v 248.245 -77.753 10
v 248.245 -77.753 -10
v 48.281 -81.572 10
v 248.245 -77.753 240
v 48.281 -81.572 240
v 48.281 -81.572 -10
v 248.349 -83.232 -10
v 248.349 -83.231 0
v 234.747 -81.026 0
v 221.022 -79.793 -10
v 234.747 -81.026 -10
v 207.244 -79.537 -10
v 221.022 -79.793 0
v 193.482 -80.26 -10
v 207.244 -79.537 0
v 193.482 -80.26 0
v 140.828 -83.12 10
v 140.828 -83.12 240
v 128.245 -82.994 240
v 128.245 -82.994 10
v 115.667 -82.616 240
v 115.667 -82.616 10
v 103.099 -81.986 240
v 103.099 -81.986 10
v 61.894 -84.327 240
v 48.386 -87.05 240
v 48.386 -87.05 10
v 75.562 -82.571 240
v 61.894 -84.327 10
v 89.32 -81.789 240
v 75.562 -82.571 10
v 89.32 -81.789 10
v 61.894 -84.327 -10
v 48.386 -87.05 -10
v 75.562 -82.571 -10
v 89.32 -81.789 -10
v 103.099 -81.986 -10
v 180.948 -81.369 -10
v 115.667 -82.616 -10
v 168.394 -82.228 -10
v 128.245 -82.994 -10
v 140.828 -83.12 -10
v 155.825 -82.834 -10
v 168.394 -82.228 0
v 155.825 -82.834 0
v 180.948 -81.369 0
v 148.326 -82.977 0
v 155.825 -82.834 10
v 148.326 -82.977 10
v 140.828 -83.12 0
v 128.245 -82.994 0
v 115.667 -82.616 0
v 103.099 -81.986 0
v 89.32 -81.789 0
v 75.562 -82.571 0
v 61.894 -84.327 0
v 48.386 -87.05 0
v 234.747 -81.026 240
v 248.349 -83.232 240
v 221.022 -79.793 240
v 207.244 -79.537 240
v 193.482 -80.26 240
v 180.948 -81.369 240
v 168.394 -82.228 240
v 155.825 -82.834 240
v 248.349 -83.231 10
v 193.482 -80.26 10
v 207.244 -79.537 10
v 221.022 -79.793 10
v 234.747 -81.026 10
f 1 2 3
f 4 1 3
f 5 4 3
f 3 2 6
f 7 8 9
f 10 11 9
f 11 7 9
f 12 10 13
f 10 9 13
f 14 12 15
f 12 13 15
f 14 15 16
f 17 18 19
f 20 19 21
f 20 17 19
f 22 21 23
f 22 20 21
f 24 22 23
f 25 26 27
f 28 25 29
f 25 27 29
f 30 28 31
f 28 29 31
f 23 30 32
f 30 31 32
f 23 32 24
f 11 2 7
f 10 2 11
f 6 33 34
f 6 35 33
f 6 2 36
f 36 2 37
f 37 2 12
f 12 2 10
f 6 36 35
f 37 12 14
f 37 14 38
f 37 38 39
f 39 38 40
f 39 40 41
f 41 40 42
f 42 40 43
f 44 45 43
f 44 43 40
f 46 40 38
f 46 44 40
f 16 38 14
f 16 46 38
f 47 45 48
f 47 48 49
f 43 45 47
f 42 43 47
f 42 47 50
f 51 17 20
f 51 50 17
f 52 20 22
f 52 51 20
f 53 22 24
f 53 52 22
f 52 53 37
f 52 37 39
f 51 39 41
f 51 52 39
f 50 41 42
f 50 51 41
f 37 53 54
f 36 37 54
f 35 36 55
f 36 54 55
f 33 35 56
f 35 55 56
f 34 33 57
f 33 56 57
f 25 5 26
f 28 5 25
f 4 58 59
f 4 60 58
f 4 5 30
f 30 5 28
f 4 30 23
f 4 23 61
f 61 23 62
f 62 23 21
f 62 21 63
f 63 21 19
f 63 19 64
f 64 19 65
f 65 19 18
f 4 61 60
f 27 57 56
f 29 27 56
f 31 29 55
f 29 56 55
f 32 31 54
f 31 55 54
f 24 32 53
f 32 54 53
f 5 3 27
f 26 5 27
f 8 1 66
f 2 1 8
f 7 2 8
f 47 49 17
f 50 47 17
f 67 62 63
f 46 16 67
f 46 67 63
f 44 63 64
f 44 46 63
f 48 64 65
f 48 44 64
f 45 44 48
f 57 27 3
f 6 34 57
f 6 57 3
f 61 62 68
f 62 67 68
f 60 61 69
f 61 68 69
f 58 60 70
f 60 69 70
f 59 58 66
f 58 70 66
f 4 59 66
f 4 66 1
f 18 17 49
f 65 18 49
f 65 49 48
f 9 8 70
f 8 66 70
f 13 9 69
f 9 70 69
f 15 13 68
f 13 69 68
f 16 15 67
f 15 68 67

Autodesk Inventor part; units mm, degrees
ref_plane "YZ Plane" through (0, 0, 0) normal (1, 0, 0) x (0, 1, 0)
ref_plane "XZ Plane" through (0, 0, 0) normal (0, 1, 0) x (-1, 0, 0)
sketch "Sketch1" plane through (0, 0, 0) normal (0, 0, 1) x (1, 0, 0)
  line L0 (0, 0) -> (293.4944, 0) construction
  line L1 (293.4944, 0) -> (293.4944, -132.0217) construction
  line L2 (293.4944, -132.0217) -> (0, -132.0217) construction
  line L3 (0, -132.0217) -> (0, 0) construction
  line L4 (79.3681, -56.3049) -> (159.3681, -56.3049) construction
  line L5 (283.1562, -93.1287) -> (274.2161, -88.6482) construction
  line L6 (283.1562, -93.1287) -> (282.3201, -93.1287) construction
  line L7 (18.3483, -97.5091) -> (27.4302, -93.3236) construction
  line L8 (18.3483, -97.5091) -> (20.5956, -97.5091) construction
  arc A0 (103.0994, -81.9859) -> (27.4302, -93.3236) centre (93.4367, -275.677) ccw
  arc A1 (274.2161, -88.6482) -> (204.4098, -79.893) centre (217.7822, -255.937) ccw
  arc A2 (103.0994, -81.9859) -> (204.4098, -79.893) centre (140.8276, 544.7964) ccw
  line L9 (27.4302, -93.3236) -> (27.4302, -72.2735)
  line L10 (27.4302, -72.2735) -> (272.6166, -67.591)
  line L11 (272.6166, -67.591) -> (274.2161, -88.6482)
  line L12 (103.0994, -81.9859) -> (86.3195, -71.1488) construction
  line L13 (204.4098, -79.893) -> (220.9707, -68.5773) construction
  line L14 (86.3195, -71.1488) -> (86.3195, -81.1488) construction
  line L15 (86.3195, -81.1488) -> (103.0994, -81.9859) construction
  line L16 (220.9707, -68.5773) -> (221.7303, -78.5773) construction
  line L17 (221.7303, -78.5773) -> (204.4098, -79.893) construction
  dimension "d5" = 80
  dimension "d85" = 10
  dimension "d87" = 26.619
  dimension "d92" = 10
  dimension "d94" = 24.743
  dimension "d100" = 22.985
  dimension "d101" = 22.755
  dimension "d106" = 10
  dimension "d111" = 10
  dimension "d112" = 30
  dimension "d113" = 30
extrude "Extrusion1" add sketch "Sketch1" along normal blind 10
sketch "Sketch2" plane through (0, 0, 10) normal (0, 0, 1) x (1, 0, 0)
  arc A0 (103.0994, -81.9859) -> (204.4098, -79.893) centre (140.8276, 544.7964) ccw projected
  line L0 (272.6166, -67.591) -> (27.4302, -72.2735) projected
  line L1 (27.4302, -72.2735) -> (27.4302, -93.3236) projected
  line L2 (274.2161, -88.6482) -> (272.6166, -67.591) projected
  line L3 (125.3768, -83.1204) -> (158.7723, -83.1204)
  line L4 (140.8276, -83.1204) -> (140.8276, -70.1078)
  line L5 (140.8276, -76.6141) -> (27.4302, -76.6141)
  line L6 (140.8276, -76.6141) -> (273.302, -76.6141)
  arc A1 (274.2161, -88.6482) -> (204.4098, -79.893) centre (217.7822, -255.937) ccw projected
  line L7 (274.2161, -88.6482) -> (272.6166, -67.591) projected
  line L8 (272.6166, -67.591) -> (27.4302, -72.2735) projected
  line L9 (27.4302, -72.2735) -> (27.4302, -93.3236) projected
  arc A2 (103.0994, -81.9859) -> (27.4302, -93.3236) centre (93.4367, -275.677) ccw projected
  arc A3 (103.0994, -81.9859) -> (204.4098, -79.893) centre (140.8276, 544.7964) ccw projected
  line L10 (140.8276, -83.1204) -> (140.4575, -63.7401)
  point P0 (0, 0)
  point P1 (204.4098, -79.893)
  point P2 (140.5792, -70.1126)
  point P3 (140.7034, -76.6141)
  dimension "d121" = 113.3974
  dimension "d122" = 132.4743
extrude "Extrusion2" cut sketch "Sketch2" against normal blind 10 contours L4 L6 L2 A1 A0 | L10 L5 L4 | L5 L10 L0 L4 | L4 L0 L2 L6
sketch "Sketch4" plane through (0, 0, 10) normal (0, 0, 1) x (1, 0, 0)
  line L0 (140.5792, -70.1126) -> (27.4302, -72.2735) projected
  line L1 (27.4302, -72.2735) -> (27.4302, -93.3236) projected
  arc A0 (103.0994, -81.9859) -> (27.4302, -93.3236) centre (93.4367, -275.677) ccw projected
  arc A1 (103.0994, -81.9859) -> (140.8276, -83.1204) centre (140.8276, 544.7964) ccw projected
  line L2 (27.4302, -72.2735) -> (27.4302, -93.3236) projected
  arc A2 (103.0994, -81.9859) -> (27.4302, -93.3236) centre (93.4367, -275.677) ccw projected
  line L3 (27.4302, -72.2735) -> (27.8295, -93.1796)
  line L4 (140.8276, -83.1204) -> (140.5792, -70.1126) projected
  point P0 (0, 0)
  point P1 (253.7282, -67.9517)
  dimension "d128" = 90
extrude "Extrusion4" cut sketch "Sketch4" against normal blind 10 contours L3 A0 L1
sketch "Sketch6" plane through (0, 0, 10) normal (0, 0, 1) x (1, 0, 0)
  line L0 (27.4302, -72.2735) -> (27.8295, -93.1796) projected
  arc A0 (103.0994, -81.9859) -> (27.8295, -93.1796) centre (93.4367, -275.677) ccw projected
  arc A1 (103.0994, -81.9859) -> (140.8276, -83.1204) centre (140.8276, 544.7964) ccw projected
  line L1 (140.8276, -83.1204) -> (140.5792, -70.1126) projected
  line L2 (140.5792, -70.1126) -> (27.4302, -72.2735) projected
  line L3 (140.5792, -70.1126) -> (27.4302, -72.2735) projected
  line L4 (140.5792, -70.1126) -> (148.0778, -69.9694)
  line L5 (148.0778, -69.9694) -> (148.3263, -82.9772)
  line L6 (140.5792, -70.1126) -> (140.8276, -83.1204) projected
  line L7 (148.3263, -82.9772) -> (140.8276, -83.1204)
  point P0 (0, 0)
  dimension "d131" = 7.5
  dimension "d132" = 0
  dimension "d135" = 180
extrude "Extrusion5" add sketch "Sketch6" against normal blind 10 contours L4 L5 L7 L1
sketch "Sketch7" plane through (0, 0, 10) normal (0, 0, 1) x (1, 0, 0)
  line L0 (27.4302, -72.2735) -> (27.8295, -93.1796) projected
  arc A0 (103.0994, -81.9859) -> (27.8295, -93.1796) centre (93.4367, -275.677) ccw projected
  arc A1 (103.0994, -81.9859) -> (140.8276, -83.1204) centre (140.8276, 544.7964) ccw projected
  line L1 (140.8276, -83.1204) -> (148.3263, -82.9772) projected
  line L2 (148.3263, -82.9772) -> (148.0778, -69.9694) projected
  line L3 (148.0778, -69.9694) -> (27.4302, -72.2735) projected
  line L4 (268.7255, -67.6653) -> (269.1247, -88.5714)
  arc A2 (269.1247, -88.5714) -> (193.4823, -80.2598) centre (210.5334, -273.4407) ccw
  arc A3 (155.8249, -82.834) -> (193.4823, -80.2598) centre (131.8501, 544.6249) ccw
  line L5 (155.8249, -82.834) -> (148.3263, -82.9772)
  line L6 (148.0778, -69.9694) -> (268.7255, -67.6653)
  point P0 (0, 0)
extrude "Extrusion6" add sketch "Sketch7" against normal blind 10 contours L6 L4 A2 A3 L5 L2
sketch "Sketch8" plane through (0, 0, 10) normal (0, 0, 1) x (1, 0, 0)
  line L0 (27.4302, -72.2735) -> (27.8295, -93.1796) projected
  arc A0 (103.0994, -81.9859) -> (27.8295, -93.1796) centre (93.4367, -275.677) ccw projected
  arc A1 (103.0994, -81.9859) -> (140.8276, -83.1204) centre (140.8276, 544.7964) ccw projected
  line L1 (140.8276, -83.1204) -> (155.8249, -82.834) projected
  arc A2 (155.8249, -82.834) -> (193.4823, -80.2598) centre (131.8501, 544.6249) ccw projected
  arc A3 (269.1247, -88.5714) -> (193.4823, -80.2598) centre (210.5334, -273.4407) ccw projected
  line L2 (269.1247, -88.5714) -> (268.7255, -67.6653) projected
  line L3 (268.7255, -67.6653) -> (27.4302, -72.2735) projected
  line L4 (27.8295, -93.1796) -> (27.4302, -72.2735) projected
  line L5 (268.7255, -67.6653) -> (269.1247, -88.5714) projected
  line L6 (27.5859, -80.4275) -> (268.8812, -75.8193)
  point P0 (0, 0)
  dimension "d138" = 3
extrude "Extrusion7" cut sketch "Sketch8" against normal blind 10 contours L3 L2 L6 L0
sketch "Sketch9" plane through (0, 0, 0) normal (0, 0, -1) x (-1, 0, 0)
  line L0 (-27.5859, -80.4275) -> (-268.8812, -75.8193) projected
  line L1 (-268.8812, -75.8193) -> (-269.1247, -88.5714) projected
  arc A0 (-193.4823, -80.2598) -> (-269.1247, -88.5714) centre (-210.5334, -273.4407) ccw projected
  arc A1 (-193.4823, -80.2598) -> (-155.8249, -82.834) centre (-131.8501, 544.6249) ccw projected
  line L2 (-155.8249, -82.834) -> (-140.8276, -83.1204) projected
  arc A2 (-140.8276, -83.1204) -> (-103.0994, -81.9859) centre (-140.8276, 544.7964) ccw projected
  arc A3 (-27.8295, -93.1796) -> (-103.0994, -81.9859) centre (-93.4367, -275.677) ccw projected
  line L3 (-27.8295, -93.1796) -> (-27.5859, -80.4275) projected
  point P0 (0, 0)
extrude "Extrusion8" add sketch "Sketch9" along normal blind 10
sketch "Sketch10" plane through (0, 0, -10) normal (0, 0, -1) x (-1, 0, 0)
  line L0 (-27.5859, -80.4275) -> (-268.8812, -75.8193) projected
  line L1 (-268.8812, -75.8193) -> (-269.1247, -88.5714) projected
  arc A0 (-193.4823, -80.2598) -> (-269.1247, -88.5714) centre (-210.5334, -273.4407) ccw projected
  arc A1 (-193.4823, -80.2598) -> (-155.8249, -82.834) centre (-131.8501, 544.6249) ccw projected
  line L2 (-155.8249, -82.834) -> (-140.8276, -83.1204) projected
  arc A2 (-140.8276, -83.1204) -> (-103.0994, -81.9859) centre (-140.8276, 544.7964) ccw projected
  arc A3 (-27.8295, -93.1796) -> (-103.0994, -81.9859) centre (-93.4367, -275.677) ccw projected
  line L3 (-27.8295, -93.1796) -> (-27.5859, -80.4275) projected
  line L4 (-148.2336, -78.1234) -> (-148.3263, -82.9772)
  line L5 (-248.2153, -76.214) -> (-248.3494, -83.2315)
  line L6 (-48.3858, -87.0503) -> (-48.2518, -80.0328)
  line L7 (-268.8812, -75.8193) -> (-27.5859, -80.4275) projected
  point P0 (0, 0)
  dimension "d143" = 100
  dimension "d144" = 100
extrude "Extrusion9" cut sketch "Sketch10" against normal through all contours L3 A3 L6 L0 | L5 A0 L1 L0
sketch "Sketch11" plane through (0, 0, 10) normal (0, 0, 1) x (1, 0, 0)
  line L0 (48.2518, -80.0328) -> (48.3858, -87.0503) projected
  arc A0 (103.0994, -81.9859) -> (48.3858, -87.0503) centre (93.4367, -275.677) ccw projected
  arc A1 (103.0994, -81.9859) -> (140.8276, -83.1204) centre (140.8276, 544.7964) ccw projected
  line L1 (140.8276, -83.1204) -> (155.8249, -82.834) projected
  arc A2 (155.8249, -82.834) -> (193.4823, -80.2598) centre (131.8501, 544.6249) ccw projected
  arc A3 (248.3494, -83.2315) -> (193.4823, -80.2598) centre (210.5334, -273.4407) ccw projected
  line L2 (248.3494, -83.2315) -> (248.2153, -76.214) projected
  line L3 (248.2153, -76.214) -> (48.2518, -80.0328) projected
  line L4 (48.2812, -81.5719) -> (248.2447, -77.753)
  circle A4 centre (93.4367, -275.677) radius 194.9319
  circle A5 centre (210.5334, -273.4407) radius 194.9319
  point P0 (0, 0)
  dimension "d147" = 1
  dimension "d148" = 1
extrude "Extrusion10" cut sketch "Sketch11" against normal through all contours L3 L2 L4 L0
sketch "Sketch12" plane through (0, 0, 10) normal (0, 0, 1) x (1, 0, 0)
  line L0 (248.2447, -77.753) -> (48.2812, -81.5719) projected
  line L1 (48.2812, -81.5719) -> (48.3858, -87.0503) projected
  arc A0 (103.0994, -81.9859) -> (48.3858, -87.0503) centre (93.4367, -275.677) ccw projected
  arc A1 (103.0994, -81.9859) -> (140.8276, -83.1204) centre (140.8276, 544.7964) ccw projected
  line L2 (140.8276, -83.1204) -> (155.8249, -82.834) projected
  arc A2 (155.8249, -82.834) -> (193.4823, -80.2598) centre (131.8501, 544.6249) ccw projected
  arc A3 (248.3494, -83.2315) -> (193.4823, -80.2598) centre (210.5334, -273.4407) ccw projected
  line L3 (248.3494, -83.2315) -> (248.2447, -77.753) projected
  point P0 (0, 0)
ref_plane "Work Plane2" through (47.6702, -81.5719, 240) normal (0, 0, -1) x (-0.0191, 0.9998, 0)
extrude "Extrusion11" add sketch "Sketch12" along normal up to surface (230 mm away)
equation "\"d111\" = d106"
equation "\"d113\" = d112"
properties part number "deseczka_dol_check - 6"
